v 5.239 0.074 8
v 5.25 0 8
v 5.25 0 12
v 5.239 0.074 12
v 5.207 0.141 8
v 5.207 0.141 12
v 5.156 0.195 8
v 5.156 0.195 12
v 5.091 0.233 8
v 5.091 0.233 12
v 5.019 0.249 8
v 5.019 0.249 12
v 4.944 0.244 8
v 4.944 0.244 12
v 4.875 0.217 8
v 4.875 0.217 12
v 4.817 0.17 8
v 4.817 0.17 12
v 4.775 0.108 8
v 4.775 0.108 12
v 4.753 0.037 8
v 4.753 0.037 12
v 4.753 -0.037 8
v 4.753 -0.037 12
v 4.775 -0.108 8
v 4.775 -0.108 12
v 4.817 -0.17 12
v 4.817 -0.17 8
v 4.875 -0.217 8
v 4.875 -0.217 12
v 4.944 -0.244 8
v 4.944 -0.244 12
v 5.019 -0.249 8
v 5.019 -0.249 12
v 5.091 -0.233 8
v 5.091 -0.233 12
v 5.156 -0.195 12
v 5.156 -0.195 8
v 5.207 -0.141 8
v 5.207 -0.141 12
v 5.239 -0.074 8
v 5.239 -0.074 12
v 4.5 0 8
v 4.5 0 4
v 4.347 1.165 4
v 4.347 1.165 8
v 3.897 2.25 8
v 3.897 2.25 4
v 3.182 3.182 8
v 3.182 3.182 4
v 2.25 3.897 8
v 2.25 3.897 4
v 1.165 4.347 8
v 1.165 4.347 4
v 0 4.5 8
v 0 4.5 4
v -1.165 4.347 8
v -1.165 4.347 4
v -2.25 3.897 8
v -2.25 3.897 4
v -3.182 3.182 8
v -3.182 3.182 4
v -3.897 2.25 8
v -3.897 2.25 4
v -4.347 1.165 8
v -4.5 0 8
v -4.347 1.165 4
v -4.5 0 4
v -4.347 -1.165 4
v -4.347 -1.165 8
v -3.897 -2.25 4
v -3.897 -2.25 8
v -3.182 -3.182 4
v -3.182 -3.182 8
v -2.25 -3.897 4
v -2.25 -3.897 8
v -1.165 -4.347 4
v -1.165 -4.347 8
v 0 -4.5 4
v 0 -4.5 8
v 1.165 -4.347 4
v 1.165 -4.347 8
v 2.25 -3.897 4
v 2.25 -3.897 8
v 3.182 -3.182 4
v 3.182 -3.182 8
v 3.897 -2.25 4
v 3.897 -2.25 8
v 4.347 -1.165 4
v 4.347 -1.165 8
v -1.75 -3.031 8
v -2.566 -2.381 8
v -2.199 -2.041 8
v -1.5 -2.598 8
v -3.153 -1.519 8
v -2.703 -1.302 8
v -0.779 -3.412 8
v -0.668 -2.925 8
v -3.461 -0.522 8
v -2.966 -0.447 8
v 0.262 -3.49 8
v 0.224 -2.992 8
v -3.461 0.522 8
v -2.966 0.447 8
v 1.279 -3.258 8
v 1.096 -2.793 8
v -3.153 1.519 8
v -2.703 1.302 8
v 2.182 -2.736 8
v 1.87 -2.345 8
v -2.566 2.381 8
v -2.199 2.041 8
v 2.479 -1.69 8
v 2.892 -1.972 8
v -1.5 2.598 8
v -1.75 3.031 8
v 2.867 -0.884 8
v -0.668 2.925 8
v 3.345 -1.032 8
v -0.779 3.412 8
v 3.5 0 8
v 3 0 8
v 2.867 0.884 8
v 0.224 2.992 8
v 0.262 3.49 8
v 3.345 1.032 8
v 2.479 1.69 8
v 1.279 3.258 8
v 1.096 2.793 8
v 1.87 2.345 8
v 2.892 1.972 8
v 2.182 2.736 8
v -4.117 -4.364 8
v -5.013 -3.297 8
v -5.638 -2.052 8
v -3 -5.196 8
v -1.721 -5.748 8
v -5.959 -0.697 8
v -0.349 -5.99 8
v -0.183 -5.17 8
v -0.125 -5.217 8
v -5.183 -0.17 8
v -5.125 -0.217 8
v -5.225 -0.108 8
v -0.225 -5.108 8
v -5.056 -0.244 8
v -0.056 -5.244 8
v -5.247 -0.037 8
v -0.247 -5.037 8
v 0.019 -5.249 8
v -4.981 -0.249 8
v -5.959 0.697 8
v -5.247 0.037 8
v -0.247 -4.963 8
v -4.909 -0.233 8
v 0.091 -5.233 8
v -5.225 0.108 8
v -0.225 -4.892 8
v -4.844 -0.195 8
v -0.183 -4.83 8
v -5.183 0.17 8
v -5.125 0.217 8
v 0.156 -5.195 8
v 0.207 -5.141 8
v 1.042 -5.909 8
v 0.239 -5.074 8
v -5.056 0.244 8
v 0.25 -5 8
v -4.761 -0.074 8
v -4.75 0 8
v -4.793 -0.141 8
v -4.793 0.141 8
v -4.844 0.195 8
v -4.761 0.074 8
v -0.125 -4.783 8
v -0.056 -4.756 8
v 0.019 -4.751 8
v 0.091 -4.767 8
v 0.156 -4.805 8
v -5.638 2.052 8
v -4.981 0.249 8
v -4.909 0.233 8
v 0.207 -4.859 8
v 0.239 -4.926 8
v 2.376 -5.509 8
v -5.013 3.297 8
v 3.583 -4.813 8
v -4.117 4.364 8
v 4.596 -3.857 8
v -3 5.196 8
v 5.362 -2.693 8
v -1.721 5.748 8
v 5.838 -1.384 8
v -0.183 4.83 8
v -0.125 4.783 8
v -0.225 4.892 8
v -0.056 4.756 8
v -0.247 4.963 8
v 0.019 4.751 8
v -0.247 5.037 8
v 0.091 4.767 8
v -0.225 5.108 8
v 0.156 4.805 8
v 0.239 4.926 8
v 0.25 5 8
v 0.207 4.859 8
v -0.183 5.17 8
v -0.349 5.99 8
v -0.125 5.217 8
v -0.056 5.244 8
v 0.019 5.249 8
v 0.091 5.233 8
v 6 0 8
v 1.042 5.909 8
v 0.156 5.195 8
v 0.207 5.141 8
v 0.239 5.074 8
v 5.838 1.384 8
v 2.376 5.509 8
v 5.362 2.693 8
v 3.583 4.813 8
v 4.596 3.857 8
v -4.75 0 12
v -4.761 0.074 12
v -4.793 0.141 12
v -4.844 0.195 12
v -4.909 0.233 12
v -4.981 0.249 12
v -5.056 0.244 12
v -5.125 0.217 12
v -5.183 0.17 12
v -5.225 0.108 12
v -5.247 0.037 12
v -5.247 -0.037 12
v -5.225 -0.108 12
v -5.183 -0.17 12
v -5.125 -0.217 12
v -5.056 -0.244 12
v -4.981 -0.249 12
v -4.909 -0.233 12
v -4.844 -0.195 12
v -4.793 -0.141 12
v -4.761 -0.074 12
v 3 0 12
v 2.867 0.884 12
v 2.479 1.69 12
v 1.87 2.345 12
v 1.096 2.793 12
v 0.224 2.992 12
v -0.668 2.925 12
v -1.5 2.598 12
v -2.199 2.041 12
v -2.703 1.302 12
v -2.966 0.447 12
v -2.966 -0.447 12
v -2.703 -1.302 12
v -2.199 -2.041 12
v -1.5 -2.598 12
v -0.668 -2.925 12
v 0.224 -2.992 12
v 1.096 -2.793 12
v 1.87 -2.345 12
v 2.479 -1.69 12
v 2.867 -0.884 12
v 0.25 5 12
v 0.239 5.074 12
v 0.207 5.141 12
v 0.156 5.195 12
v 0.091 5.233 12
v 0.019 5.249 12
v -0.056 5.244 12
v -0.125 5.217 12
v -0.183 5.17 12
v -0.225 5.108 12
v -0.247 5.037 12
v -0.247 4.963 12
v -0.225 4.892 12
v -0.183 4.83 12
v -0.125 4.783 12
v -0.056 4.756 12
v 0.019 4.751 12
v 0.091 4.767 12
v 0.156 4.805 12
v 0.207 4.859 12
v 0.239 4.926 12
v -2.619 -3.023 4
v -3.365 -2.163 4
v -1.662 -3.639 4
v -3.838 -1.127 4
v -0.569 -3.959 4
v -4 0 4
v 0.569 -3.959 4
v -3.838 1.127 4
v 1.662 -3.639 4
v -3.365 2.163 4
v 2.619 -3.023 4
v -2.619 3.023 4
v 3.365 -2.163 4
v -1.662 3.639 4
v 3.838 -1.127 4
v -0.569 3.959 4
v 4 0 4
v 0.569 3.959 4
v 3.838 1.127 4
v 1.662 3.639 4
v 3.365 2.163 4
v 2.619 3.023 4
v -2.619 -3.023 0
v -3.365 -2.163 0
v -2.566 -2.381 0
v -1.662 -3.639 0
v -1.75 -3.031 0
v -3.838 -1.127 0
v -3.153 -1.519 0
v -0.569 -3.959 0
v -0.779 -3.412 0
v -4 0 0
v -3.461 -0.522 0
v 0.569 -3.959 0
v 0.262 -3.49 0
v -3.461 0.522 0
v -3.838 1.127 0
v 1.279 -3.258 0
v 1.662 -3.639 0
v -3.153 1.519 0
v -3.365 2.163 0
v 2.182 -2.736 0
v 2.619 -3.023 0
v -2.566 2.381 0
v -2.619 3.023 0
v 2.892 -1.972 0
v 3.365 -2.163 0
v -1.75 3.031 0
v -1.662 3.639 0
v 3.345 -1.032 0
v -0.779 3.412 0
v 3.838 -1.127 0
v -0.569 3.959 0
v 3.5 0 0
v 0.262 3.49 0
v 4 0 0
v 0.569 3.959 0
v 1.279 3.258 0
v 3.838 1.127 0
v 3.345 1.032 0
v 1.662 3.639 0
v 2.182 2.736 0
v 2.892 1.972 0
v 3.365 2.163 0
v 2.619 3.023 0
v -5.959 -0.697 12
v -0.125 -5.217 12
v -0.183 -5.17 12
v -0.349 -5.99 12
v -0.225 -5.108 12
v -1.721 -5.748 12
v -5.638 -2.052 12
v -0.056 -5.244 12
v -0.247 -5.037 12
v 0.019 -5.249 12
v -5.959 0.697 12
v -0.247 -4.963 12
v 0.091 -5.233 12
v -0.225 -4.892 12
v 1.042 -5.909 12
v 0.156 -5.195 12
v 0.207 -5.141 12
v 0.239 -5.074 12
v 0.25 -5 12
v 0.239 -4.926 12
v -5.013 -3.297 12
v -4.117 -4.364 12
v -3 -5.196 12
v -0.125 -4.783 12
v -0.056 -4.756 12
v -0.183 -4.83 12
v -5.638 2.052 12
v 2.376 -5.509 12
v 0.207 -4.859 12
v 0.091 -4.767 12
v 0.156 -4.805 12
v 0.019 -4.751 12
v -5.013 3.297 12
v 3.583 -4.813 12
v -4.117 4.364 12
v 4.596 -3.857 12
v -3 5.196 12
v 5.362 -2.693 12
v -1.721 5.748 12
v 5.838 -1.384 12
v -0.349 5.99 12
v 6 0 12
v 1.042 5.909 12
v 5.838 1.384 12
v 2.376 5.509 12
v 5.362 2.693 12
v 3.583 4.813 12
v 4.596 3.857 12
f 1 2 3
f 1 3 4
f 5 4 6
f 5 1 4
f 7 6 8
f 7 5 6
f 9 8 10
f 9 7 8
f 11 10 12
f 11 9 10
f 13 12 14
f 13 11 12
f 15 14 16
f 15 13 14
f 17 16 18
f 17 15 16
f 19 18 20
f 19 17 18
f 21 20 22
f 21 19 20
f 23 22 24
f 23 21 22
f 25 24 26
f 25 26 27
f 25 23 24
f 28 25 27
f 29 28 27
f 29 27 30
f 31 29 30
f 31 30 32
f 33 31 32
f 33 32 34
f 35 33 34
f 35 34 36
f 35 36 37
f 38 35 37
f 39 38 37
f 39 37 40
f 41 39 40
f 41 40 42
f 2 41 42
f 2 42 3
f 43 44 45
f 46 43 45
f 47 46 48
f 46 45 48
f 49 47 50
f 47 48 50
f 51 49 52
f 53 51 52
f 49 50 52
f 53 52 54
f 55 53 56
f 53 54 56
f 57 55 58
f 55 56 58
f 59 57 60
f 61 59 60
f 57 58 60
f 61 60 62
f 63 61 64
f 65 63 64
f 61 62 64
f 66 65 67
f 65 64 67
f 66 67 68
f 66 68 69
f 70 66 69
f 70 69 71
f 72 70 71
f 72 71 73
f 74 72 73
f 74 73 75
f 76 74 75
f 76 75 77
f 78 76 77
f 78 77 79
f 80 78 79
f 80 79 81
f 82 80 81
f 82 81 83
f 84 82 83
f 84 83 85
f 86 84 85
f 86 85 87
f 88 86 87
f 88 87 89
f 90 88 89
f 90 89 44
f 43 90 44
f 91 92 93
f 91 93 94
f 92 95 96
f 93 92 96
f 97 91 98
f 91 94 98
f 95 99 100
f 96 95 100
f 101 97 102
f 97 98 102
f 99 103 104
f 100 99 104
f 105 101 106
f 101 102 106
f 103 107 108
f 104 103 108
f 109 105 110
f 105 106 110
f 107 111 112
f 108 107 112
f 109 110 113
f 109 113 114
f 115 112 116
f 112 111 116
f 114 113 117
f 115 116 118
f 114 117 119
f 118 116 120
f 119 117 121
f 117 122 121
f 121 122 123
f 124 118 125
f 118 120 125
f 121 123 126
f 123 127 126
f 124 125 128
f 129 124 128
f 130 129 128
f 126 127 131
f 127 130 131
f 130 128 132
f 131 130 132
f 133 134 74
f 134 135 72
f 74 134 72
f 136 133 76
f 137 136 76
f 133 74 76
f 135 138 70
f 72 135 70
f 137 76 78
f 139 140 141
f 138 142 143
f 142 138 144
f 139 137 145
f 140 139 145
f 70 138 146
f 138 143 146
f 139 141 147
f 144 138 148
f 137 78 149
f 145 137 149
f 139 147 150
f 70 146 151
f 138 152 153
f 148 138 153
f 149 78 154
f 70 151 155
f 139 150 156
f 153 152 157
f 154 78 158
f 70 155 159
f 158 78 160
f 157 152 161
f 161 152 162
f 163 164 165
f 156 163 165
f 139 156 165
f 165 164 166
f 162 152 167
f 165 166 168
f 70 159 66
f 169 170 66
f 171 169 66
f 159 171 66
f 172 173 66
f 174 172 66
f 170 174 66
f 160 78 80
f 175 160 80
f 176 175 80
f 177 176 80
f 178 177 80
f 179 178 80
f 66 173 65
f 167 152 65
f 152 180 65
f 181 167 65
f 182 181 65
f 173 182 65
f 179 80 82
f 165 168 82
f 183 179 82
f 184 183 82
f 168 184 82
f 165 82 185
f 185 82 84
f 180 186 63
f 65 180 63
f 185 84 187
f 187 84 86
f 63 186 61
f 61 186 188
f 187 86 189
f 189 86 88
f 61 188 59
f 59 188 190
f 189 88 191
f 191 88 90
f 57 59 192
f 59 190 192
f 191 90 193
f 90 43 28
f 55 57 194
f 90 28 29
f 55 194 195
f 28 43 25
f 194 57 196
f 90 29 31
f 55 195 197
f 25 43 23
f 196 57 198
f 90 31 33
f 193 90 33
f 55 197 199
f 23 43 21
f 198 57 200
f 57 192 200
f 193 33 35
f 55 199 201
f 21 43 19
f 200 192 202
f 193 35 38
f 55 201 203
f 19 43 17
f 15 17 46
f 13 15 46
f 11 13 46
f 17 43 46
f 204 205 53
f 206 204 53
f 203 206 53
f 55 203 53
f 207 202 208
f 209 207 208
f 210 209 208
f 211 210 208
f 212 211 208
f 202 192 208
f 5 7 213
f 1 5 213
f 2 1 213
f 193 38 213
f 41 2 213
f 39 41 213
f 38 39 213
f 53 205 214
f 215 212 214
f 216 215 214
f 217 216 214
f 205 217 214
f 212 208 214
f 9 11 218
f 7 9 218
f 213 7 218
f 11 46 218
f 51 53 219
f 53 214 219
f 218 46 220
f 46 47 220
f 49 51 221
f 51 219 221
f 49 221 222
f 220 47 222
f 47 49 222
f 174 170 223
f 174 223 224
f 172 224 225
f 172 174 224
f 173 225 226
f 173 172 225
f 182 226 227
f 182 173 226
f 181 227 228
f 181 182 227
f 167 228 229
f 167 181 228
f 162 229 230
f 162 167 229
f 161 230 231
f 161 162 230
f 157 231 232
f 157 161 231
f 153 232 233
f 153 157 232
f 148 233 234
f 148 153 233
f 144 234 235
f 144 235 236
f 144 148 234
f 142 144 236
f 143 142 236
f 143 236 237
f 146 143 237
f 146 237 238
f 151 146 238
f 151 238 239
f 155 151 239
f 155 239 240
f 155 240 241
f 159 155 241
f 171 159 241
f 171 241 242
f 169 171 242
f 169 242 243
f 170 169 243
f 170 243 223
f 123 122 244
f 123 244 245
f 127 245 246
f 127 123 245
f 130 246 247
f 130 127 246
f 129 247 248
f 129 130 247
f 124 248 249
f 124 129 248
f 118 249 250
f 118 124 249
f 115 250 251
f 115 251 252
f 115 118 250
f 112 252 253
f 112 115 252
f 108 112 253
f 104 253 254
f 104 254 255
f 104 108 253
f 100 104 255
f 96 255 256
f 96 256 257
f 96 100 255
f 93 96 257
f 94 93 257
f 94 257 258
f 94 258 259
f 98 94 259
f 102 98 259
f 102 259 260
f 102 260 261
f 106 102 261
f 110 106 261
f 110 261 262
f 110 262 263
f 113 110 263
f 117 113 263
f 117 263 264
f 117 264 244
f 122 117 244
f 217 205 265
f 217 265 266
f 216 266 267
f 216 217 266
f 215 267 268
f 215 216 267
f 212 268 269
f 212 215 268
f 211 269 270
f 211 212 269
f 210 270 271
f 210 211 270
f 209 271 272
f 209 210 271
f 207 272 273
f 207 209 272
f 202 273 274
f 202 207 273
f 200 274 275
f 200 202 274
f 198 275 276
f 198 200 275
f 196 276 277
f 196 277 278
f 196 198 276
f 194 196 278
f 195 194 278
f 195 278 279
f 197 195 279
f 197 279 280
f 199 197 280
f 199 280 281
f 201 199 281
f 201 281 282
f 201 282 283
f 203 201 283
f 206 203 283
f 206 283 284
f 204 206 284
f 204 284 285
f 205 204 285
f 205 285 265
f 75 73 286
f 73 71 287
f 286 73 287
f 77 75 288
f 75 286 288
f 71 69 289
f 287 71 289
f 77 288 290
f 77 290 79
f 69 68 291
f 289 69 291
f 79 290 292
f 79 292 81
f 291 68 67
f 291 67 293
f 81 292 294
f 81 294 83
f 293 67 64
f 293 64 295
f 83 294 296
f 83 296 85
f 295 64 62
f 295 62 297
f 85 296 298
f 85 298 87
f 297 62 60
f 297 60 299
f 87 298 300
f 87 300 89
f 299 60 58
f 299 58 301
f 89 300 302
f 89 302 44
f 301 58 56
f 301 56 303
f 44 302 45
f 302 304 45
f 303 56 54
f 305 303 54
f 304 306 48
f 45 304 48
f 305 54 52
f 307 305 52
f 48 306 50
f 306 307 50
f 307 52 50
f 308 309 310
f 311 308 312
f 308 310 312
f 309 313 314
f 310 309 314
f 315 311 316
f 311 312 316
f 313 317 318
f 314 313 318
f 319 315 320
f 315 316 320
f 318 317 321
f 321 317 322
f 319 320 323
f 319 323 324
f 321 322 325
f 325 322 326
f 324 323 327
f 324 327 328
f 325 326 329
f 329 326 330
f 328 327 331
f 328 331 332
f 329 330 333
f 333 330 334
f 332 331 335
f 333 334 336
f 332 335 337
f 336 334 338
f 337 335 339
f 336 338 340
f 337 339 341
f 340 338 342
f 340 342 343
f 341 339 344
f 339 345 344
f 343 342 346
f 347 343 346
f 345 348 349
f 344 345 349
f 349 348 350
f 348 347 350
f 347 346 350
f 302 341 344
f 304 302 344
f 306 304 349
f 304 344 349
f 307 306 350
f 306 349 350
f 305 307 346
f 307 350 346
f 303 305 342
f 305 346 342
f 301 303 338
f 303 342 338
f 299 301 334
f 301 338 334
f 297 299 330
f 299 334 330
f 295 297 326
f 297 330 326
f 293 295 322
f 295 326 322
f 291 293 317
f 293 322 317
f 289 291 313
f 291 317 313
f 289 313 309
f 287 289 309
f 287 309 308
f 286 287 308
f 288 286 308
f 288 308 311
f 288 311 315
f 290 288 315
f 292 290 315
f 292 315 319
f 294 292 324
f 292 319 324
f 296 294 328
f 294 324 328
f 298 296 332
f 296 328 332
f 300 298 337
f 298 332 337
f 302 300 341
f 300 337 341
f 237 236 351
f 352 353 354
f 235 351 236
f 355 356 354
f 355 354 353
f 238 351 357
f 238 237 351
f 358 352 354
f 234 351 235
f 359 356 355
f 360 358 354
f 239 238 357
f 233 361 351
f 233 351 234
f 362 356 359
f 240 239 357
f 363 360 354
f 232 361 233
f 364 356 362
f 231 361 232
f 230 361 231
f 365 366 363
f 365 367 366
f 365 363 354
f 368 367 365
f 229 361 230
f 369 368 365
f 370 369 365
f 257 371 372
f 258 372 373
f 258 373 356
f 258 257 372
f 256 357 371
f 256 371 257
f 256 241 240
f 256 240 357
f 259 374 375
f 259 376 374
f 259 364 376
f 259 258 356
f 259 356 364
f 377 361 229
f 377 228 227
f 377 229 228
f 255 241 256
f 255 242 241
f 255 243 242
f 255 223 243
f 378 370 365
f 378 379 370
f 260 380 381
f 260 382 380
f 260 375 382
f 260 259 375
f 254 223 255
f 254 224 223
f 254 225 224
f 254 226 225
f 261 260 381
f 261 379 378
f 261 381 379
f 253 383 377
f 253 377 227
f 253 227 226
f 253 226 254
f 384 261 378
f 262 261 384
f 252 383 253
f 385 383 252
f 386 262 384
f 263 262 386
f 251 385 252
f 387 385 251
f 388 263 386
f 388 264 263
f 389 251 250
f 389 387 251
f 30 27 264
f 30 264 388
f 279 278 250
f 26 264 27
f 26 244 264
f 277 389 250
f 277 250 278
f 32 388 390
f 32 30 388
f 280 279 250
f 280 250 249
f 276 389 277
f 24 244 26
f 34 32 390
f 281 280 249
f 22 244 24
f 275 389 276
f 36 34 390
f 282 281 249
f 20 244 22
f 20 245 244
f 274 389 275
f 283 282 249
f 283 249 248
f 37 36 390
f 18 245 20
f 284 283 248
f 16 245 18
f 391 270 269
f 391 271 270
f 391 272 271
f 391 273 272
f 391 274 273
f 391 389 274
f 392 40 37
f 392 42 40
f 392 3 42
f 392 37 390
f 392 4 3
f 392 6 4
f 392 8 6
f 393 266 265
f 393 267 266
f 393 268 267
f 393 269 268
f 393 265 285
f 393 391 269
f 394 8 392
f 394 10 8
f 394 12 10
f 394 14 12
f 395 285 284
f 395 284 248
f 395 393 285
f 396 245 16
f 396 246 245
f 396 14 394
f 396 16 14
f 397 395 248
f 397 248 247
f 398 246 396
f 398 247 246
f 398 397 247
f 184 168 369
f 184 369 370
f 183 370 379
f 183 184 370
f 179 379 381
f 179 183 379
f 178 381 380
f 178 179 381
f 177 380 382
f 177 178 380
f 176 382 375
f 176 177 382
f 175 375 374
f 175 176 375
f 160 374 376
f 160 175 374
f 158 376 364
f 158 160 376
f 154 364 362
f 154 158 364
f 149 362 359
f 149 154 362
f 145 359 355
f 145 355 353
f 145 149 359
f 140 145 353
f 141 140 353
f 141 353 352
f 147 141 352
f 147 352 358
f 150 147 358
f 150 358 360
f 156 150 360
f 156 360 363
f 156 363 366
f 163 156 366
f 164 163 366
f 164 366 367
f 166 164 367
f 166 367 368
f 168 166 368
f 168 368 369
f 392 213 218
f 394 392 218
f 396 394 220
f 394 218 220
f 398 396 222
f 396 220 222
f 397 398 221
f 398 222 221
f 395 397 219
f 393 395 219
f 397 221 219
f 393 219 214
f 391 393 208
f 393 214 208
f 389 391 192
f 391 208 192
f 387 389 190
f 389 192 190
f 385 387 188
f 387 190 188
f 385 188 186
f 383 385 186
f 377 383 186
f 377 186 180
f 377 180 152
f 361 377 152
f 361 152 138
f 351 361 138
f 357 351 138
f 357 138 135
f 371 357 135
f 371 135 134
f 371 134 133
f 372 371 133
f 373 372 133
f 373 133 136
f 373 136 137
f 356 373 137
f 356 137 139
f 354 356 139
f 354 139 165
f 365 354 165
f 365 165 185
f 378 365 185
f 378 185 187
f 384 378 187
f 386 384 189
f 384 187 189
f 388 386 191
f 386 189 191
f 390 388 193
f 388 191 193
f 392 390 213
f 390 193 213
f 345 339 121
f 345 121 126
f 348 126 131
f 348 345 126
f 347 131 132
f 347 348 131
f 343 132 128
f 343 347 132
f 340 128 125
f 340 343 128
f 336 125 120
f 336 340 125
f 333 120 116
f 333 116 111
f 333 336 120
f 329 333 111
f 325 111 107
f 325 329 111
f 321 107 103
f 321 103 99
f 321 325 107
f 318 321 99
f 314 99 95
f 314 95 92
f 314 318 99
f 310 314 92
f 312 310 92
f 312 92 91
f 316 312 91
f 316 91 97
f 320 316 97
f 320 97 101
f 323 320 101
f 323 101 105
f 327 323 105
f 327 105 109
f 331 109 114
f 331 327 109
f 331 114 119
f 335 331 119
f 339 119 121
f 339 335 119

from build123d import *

# Parameters (mm, degrees)
SKETCH_R          = 6
SKETCH_R_2        = 3
SKETCH_R_3        = 0.25
PAD_DEPTH         = 12
CYLINDER_R        = 6
CYLINDER_DEPTH    = 8
CYLINDER001_R     = 4.5
CYLINDER001_DEPTH = 8
CYLINDER002_R     = 4.5
CYLINDER002_DEPTH = 4
CYLINDER003_R     = 4
CYLINDER003_DEPTH = 4
CYLINDER004_R     = 3.5
CYLINDER004_DEPTH = 8


with BuildPart() as part:
    # Sketch → Pad (new body)
    with BuildSketch(Plane.XY):
        Circle(SKETCH_R)
        Circle(SKETCH_R_2, mode=Mode.SUBTRACT)
        with Locations((-5, 0)):
            Circle(SKETCH_R_3, mode=Mode.SUBTRACT)
        with Locations((5, 0)):
            Circle(SKETCH_R_3, mode=Mode.SUBTRACT)
        with Locations((0, 5)):
            Circle(SKETCH_R_3, mode=Mode.SUBTRACT)
        with Locations((0, -5)):
            Circle(SKETCH_R_3, mode=Mode.SUBTRACT)
    extrude(amount=PAD_DEPTH)

    # Cylinder → Cylinder (cut)
    with BuildSketch(Plane.XY):
        Circle(CYLINDER_R)
    extrude(amount=CYLINDER_DEPTH, mode=Mode.SUBTRACT)

    # Cylinder001 → Cylinder001 (join)
    with BuildSketch(Plane.XY):
        Circle(CYLINDER001_R)
    extrude(amount=CYLINDER001_DEPTH)

    # Cylinder002 → Cylinder002 (cut)
    with BuildSketch(Plane.XY):
        Circle(CYLINDER002_R)
    extrude(amount=CYLINDER002_DEPTH, mode=Mode.SUBTRACT)

    # Cylinder003 → Cylinder003 (join)
    with BuildSketch(Plane.XY):
        Circle(CYLINDER003_R)
    extrude(amount=CYLINDER003_DEPTH)

    # Cylinder004 → Cylinder004 (cut)
    with BuildSketch(Plane.XY):
        Circle(CYLINDER004_R)
    extrude(amount=CYLINDER004_DEPTH, mode=Mode.SUBTRACT)


solid = part.part
